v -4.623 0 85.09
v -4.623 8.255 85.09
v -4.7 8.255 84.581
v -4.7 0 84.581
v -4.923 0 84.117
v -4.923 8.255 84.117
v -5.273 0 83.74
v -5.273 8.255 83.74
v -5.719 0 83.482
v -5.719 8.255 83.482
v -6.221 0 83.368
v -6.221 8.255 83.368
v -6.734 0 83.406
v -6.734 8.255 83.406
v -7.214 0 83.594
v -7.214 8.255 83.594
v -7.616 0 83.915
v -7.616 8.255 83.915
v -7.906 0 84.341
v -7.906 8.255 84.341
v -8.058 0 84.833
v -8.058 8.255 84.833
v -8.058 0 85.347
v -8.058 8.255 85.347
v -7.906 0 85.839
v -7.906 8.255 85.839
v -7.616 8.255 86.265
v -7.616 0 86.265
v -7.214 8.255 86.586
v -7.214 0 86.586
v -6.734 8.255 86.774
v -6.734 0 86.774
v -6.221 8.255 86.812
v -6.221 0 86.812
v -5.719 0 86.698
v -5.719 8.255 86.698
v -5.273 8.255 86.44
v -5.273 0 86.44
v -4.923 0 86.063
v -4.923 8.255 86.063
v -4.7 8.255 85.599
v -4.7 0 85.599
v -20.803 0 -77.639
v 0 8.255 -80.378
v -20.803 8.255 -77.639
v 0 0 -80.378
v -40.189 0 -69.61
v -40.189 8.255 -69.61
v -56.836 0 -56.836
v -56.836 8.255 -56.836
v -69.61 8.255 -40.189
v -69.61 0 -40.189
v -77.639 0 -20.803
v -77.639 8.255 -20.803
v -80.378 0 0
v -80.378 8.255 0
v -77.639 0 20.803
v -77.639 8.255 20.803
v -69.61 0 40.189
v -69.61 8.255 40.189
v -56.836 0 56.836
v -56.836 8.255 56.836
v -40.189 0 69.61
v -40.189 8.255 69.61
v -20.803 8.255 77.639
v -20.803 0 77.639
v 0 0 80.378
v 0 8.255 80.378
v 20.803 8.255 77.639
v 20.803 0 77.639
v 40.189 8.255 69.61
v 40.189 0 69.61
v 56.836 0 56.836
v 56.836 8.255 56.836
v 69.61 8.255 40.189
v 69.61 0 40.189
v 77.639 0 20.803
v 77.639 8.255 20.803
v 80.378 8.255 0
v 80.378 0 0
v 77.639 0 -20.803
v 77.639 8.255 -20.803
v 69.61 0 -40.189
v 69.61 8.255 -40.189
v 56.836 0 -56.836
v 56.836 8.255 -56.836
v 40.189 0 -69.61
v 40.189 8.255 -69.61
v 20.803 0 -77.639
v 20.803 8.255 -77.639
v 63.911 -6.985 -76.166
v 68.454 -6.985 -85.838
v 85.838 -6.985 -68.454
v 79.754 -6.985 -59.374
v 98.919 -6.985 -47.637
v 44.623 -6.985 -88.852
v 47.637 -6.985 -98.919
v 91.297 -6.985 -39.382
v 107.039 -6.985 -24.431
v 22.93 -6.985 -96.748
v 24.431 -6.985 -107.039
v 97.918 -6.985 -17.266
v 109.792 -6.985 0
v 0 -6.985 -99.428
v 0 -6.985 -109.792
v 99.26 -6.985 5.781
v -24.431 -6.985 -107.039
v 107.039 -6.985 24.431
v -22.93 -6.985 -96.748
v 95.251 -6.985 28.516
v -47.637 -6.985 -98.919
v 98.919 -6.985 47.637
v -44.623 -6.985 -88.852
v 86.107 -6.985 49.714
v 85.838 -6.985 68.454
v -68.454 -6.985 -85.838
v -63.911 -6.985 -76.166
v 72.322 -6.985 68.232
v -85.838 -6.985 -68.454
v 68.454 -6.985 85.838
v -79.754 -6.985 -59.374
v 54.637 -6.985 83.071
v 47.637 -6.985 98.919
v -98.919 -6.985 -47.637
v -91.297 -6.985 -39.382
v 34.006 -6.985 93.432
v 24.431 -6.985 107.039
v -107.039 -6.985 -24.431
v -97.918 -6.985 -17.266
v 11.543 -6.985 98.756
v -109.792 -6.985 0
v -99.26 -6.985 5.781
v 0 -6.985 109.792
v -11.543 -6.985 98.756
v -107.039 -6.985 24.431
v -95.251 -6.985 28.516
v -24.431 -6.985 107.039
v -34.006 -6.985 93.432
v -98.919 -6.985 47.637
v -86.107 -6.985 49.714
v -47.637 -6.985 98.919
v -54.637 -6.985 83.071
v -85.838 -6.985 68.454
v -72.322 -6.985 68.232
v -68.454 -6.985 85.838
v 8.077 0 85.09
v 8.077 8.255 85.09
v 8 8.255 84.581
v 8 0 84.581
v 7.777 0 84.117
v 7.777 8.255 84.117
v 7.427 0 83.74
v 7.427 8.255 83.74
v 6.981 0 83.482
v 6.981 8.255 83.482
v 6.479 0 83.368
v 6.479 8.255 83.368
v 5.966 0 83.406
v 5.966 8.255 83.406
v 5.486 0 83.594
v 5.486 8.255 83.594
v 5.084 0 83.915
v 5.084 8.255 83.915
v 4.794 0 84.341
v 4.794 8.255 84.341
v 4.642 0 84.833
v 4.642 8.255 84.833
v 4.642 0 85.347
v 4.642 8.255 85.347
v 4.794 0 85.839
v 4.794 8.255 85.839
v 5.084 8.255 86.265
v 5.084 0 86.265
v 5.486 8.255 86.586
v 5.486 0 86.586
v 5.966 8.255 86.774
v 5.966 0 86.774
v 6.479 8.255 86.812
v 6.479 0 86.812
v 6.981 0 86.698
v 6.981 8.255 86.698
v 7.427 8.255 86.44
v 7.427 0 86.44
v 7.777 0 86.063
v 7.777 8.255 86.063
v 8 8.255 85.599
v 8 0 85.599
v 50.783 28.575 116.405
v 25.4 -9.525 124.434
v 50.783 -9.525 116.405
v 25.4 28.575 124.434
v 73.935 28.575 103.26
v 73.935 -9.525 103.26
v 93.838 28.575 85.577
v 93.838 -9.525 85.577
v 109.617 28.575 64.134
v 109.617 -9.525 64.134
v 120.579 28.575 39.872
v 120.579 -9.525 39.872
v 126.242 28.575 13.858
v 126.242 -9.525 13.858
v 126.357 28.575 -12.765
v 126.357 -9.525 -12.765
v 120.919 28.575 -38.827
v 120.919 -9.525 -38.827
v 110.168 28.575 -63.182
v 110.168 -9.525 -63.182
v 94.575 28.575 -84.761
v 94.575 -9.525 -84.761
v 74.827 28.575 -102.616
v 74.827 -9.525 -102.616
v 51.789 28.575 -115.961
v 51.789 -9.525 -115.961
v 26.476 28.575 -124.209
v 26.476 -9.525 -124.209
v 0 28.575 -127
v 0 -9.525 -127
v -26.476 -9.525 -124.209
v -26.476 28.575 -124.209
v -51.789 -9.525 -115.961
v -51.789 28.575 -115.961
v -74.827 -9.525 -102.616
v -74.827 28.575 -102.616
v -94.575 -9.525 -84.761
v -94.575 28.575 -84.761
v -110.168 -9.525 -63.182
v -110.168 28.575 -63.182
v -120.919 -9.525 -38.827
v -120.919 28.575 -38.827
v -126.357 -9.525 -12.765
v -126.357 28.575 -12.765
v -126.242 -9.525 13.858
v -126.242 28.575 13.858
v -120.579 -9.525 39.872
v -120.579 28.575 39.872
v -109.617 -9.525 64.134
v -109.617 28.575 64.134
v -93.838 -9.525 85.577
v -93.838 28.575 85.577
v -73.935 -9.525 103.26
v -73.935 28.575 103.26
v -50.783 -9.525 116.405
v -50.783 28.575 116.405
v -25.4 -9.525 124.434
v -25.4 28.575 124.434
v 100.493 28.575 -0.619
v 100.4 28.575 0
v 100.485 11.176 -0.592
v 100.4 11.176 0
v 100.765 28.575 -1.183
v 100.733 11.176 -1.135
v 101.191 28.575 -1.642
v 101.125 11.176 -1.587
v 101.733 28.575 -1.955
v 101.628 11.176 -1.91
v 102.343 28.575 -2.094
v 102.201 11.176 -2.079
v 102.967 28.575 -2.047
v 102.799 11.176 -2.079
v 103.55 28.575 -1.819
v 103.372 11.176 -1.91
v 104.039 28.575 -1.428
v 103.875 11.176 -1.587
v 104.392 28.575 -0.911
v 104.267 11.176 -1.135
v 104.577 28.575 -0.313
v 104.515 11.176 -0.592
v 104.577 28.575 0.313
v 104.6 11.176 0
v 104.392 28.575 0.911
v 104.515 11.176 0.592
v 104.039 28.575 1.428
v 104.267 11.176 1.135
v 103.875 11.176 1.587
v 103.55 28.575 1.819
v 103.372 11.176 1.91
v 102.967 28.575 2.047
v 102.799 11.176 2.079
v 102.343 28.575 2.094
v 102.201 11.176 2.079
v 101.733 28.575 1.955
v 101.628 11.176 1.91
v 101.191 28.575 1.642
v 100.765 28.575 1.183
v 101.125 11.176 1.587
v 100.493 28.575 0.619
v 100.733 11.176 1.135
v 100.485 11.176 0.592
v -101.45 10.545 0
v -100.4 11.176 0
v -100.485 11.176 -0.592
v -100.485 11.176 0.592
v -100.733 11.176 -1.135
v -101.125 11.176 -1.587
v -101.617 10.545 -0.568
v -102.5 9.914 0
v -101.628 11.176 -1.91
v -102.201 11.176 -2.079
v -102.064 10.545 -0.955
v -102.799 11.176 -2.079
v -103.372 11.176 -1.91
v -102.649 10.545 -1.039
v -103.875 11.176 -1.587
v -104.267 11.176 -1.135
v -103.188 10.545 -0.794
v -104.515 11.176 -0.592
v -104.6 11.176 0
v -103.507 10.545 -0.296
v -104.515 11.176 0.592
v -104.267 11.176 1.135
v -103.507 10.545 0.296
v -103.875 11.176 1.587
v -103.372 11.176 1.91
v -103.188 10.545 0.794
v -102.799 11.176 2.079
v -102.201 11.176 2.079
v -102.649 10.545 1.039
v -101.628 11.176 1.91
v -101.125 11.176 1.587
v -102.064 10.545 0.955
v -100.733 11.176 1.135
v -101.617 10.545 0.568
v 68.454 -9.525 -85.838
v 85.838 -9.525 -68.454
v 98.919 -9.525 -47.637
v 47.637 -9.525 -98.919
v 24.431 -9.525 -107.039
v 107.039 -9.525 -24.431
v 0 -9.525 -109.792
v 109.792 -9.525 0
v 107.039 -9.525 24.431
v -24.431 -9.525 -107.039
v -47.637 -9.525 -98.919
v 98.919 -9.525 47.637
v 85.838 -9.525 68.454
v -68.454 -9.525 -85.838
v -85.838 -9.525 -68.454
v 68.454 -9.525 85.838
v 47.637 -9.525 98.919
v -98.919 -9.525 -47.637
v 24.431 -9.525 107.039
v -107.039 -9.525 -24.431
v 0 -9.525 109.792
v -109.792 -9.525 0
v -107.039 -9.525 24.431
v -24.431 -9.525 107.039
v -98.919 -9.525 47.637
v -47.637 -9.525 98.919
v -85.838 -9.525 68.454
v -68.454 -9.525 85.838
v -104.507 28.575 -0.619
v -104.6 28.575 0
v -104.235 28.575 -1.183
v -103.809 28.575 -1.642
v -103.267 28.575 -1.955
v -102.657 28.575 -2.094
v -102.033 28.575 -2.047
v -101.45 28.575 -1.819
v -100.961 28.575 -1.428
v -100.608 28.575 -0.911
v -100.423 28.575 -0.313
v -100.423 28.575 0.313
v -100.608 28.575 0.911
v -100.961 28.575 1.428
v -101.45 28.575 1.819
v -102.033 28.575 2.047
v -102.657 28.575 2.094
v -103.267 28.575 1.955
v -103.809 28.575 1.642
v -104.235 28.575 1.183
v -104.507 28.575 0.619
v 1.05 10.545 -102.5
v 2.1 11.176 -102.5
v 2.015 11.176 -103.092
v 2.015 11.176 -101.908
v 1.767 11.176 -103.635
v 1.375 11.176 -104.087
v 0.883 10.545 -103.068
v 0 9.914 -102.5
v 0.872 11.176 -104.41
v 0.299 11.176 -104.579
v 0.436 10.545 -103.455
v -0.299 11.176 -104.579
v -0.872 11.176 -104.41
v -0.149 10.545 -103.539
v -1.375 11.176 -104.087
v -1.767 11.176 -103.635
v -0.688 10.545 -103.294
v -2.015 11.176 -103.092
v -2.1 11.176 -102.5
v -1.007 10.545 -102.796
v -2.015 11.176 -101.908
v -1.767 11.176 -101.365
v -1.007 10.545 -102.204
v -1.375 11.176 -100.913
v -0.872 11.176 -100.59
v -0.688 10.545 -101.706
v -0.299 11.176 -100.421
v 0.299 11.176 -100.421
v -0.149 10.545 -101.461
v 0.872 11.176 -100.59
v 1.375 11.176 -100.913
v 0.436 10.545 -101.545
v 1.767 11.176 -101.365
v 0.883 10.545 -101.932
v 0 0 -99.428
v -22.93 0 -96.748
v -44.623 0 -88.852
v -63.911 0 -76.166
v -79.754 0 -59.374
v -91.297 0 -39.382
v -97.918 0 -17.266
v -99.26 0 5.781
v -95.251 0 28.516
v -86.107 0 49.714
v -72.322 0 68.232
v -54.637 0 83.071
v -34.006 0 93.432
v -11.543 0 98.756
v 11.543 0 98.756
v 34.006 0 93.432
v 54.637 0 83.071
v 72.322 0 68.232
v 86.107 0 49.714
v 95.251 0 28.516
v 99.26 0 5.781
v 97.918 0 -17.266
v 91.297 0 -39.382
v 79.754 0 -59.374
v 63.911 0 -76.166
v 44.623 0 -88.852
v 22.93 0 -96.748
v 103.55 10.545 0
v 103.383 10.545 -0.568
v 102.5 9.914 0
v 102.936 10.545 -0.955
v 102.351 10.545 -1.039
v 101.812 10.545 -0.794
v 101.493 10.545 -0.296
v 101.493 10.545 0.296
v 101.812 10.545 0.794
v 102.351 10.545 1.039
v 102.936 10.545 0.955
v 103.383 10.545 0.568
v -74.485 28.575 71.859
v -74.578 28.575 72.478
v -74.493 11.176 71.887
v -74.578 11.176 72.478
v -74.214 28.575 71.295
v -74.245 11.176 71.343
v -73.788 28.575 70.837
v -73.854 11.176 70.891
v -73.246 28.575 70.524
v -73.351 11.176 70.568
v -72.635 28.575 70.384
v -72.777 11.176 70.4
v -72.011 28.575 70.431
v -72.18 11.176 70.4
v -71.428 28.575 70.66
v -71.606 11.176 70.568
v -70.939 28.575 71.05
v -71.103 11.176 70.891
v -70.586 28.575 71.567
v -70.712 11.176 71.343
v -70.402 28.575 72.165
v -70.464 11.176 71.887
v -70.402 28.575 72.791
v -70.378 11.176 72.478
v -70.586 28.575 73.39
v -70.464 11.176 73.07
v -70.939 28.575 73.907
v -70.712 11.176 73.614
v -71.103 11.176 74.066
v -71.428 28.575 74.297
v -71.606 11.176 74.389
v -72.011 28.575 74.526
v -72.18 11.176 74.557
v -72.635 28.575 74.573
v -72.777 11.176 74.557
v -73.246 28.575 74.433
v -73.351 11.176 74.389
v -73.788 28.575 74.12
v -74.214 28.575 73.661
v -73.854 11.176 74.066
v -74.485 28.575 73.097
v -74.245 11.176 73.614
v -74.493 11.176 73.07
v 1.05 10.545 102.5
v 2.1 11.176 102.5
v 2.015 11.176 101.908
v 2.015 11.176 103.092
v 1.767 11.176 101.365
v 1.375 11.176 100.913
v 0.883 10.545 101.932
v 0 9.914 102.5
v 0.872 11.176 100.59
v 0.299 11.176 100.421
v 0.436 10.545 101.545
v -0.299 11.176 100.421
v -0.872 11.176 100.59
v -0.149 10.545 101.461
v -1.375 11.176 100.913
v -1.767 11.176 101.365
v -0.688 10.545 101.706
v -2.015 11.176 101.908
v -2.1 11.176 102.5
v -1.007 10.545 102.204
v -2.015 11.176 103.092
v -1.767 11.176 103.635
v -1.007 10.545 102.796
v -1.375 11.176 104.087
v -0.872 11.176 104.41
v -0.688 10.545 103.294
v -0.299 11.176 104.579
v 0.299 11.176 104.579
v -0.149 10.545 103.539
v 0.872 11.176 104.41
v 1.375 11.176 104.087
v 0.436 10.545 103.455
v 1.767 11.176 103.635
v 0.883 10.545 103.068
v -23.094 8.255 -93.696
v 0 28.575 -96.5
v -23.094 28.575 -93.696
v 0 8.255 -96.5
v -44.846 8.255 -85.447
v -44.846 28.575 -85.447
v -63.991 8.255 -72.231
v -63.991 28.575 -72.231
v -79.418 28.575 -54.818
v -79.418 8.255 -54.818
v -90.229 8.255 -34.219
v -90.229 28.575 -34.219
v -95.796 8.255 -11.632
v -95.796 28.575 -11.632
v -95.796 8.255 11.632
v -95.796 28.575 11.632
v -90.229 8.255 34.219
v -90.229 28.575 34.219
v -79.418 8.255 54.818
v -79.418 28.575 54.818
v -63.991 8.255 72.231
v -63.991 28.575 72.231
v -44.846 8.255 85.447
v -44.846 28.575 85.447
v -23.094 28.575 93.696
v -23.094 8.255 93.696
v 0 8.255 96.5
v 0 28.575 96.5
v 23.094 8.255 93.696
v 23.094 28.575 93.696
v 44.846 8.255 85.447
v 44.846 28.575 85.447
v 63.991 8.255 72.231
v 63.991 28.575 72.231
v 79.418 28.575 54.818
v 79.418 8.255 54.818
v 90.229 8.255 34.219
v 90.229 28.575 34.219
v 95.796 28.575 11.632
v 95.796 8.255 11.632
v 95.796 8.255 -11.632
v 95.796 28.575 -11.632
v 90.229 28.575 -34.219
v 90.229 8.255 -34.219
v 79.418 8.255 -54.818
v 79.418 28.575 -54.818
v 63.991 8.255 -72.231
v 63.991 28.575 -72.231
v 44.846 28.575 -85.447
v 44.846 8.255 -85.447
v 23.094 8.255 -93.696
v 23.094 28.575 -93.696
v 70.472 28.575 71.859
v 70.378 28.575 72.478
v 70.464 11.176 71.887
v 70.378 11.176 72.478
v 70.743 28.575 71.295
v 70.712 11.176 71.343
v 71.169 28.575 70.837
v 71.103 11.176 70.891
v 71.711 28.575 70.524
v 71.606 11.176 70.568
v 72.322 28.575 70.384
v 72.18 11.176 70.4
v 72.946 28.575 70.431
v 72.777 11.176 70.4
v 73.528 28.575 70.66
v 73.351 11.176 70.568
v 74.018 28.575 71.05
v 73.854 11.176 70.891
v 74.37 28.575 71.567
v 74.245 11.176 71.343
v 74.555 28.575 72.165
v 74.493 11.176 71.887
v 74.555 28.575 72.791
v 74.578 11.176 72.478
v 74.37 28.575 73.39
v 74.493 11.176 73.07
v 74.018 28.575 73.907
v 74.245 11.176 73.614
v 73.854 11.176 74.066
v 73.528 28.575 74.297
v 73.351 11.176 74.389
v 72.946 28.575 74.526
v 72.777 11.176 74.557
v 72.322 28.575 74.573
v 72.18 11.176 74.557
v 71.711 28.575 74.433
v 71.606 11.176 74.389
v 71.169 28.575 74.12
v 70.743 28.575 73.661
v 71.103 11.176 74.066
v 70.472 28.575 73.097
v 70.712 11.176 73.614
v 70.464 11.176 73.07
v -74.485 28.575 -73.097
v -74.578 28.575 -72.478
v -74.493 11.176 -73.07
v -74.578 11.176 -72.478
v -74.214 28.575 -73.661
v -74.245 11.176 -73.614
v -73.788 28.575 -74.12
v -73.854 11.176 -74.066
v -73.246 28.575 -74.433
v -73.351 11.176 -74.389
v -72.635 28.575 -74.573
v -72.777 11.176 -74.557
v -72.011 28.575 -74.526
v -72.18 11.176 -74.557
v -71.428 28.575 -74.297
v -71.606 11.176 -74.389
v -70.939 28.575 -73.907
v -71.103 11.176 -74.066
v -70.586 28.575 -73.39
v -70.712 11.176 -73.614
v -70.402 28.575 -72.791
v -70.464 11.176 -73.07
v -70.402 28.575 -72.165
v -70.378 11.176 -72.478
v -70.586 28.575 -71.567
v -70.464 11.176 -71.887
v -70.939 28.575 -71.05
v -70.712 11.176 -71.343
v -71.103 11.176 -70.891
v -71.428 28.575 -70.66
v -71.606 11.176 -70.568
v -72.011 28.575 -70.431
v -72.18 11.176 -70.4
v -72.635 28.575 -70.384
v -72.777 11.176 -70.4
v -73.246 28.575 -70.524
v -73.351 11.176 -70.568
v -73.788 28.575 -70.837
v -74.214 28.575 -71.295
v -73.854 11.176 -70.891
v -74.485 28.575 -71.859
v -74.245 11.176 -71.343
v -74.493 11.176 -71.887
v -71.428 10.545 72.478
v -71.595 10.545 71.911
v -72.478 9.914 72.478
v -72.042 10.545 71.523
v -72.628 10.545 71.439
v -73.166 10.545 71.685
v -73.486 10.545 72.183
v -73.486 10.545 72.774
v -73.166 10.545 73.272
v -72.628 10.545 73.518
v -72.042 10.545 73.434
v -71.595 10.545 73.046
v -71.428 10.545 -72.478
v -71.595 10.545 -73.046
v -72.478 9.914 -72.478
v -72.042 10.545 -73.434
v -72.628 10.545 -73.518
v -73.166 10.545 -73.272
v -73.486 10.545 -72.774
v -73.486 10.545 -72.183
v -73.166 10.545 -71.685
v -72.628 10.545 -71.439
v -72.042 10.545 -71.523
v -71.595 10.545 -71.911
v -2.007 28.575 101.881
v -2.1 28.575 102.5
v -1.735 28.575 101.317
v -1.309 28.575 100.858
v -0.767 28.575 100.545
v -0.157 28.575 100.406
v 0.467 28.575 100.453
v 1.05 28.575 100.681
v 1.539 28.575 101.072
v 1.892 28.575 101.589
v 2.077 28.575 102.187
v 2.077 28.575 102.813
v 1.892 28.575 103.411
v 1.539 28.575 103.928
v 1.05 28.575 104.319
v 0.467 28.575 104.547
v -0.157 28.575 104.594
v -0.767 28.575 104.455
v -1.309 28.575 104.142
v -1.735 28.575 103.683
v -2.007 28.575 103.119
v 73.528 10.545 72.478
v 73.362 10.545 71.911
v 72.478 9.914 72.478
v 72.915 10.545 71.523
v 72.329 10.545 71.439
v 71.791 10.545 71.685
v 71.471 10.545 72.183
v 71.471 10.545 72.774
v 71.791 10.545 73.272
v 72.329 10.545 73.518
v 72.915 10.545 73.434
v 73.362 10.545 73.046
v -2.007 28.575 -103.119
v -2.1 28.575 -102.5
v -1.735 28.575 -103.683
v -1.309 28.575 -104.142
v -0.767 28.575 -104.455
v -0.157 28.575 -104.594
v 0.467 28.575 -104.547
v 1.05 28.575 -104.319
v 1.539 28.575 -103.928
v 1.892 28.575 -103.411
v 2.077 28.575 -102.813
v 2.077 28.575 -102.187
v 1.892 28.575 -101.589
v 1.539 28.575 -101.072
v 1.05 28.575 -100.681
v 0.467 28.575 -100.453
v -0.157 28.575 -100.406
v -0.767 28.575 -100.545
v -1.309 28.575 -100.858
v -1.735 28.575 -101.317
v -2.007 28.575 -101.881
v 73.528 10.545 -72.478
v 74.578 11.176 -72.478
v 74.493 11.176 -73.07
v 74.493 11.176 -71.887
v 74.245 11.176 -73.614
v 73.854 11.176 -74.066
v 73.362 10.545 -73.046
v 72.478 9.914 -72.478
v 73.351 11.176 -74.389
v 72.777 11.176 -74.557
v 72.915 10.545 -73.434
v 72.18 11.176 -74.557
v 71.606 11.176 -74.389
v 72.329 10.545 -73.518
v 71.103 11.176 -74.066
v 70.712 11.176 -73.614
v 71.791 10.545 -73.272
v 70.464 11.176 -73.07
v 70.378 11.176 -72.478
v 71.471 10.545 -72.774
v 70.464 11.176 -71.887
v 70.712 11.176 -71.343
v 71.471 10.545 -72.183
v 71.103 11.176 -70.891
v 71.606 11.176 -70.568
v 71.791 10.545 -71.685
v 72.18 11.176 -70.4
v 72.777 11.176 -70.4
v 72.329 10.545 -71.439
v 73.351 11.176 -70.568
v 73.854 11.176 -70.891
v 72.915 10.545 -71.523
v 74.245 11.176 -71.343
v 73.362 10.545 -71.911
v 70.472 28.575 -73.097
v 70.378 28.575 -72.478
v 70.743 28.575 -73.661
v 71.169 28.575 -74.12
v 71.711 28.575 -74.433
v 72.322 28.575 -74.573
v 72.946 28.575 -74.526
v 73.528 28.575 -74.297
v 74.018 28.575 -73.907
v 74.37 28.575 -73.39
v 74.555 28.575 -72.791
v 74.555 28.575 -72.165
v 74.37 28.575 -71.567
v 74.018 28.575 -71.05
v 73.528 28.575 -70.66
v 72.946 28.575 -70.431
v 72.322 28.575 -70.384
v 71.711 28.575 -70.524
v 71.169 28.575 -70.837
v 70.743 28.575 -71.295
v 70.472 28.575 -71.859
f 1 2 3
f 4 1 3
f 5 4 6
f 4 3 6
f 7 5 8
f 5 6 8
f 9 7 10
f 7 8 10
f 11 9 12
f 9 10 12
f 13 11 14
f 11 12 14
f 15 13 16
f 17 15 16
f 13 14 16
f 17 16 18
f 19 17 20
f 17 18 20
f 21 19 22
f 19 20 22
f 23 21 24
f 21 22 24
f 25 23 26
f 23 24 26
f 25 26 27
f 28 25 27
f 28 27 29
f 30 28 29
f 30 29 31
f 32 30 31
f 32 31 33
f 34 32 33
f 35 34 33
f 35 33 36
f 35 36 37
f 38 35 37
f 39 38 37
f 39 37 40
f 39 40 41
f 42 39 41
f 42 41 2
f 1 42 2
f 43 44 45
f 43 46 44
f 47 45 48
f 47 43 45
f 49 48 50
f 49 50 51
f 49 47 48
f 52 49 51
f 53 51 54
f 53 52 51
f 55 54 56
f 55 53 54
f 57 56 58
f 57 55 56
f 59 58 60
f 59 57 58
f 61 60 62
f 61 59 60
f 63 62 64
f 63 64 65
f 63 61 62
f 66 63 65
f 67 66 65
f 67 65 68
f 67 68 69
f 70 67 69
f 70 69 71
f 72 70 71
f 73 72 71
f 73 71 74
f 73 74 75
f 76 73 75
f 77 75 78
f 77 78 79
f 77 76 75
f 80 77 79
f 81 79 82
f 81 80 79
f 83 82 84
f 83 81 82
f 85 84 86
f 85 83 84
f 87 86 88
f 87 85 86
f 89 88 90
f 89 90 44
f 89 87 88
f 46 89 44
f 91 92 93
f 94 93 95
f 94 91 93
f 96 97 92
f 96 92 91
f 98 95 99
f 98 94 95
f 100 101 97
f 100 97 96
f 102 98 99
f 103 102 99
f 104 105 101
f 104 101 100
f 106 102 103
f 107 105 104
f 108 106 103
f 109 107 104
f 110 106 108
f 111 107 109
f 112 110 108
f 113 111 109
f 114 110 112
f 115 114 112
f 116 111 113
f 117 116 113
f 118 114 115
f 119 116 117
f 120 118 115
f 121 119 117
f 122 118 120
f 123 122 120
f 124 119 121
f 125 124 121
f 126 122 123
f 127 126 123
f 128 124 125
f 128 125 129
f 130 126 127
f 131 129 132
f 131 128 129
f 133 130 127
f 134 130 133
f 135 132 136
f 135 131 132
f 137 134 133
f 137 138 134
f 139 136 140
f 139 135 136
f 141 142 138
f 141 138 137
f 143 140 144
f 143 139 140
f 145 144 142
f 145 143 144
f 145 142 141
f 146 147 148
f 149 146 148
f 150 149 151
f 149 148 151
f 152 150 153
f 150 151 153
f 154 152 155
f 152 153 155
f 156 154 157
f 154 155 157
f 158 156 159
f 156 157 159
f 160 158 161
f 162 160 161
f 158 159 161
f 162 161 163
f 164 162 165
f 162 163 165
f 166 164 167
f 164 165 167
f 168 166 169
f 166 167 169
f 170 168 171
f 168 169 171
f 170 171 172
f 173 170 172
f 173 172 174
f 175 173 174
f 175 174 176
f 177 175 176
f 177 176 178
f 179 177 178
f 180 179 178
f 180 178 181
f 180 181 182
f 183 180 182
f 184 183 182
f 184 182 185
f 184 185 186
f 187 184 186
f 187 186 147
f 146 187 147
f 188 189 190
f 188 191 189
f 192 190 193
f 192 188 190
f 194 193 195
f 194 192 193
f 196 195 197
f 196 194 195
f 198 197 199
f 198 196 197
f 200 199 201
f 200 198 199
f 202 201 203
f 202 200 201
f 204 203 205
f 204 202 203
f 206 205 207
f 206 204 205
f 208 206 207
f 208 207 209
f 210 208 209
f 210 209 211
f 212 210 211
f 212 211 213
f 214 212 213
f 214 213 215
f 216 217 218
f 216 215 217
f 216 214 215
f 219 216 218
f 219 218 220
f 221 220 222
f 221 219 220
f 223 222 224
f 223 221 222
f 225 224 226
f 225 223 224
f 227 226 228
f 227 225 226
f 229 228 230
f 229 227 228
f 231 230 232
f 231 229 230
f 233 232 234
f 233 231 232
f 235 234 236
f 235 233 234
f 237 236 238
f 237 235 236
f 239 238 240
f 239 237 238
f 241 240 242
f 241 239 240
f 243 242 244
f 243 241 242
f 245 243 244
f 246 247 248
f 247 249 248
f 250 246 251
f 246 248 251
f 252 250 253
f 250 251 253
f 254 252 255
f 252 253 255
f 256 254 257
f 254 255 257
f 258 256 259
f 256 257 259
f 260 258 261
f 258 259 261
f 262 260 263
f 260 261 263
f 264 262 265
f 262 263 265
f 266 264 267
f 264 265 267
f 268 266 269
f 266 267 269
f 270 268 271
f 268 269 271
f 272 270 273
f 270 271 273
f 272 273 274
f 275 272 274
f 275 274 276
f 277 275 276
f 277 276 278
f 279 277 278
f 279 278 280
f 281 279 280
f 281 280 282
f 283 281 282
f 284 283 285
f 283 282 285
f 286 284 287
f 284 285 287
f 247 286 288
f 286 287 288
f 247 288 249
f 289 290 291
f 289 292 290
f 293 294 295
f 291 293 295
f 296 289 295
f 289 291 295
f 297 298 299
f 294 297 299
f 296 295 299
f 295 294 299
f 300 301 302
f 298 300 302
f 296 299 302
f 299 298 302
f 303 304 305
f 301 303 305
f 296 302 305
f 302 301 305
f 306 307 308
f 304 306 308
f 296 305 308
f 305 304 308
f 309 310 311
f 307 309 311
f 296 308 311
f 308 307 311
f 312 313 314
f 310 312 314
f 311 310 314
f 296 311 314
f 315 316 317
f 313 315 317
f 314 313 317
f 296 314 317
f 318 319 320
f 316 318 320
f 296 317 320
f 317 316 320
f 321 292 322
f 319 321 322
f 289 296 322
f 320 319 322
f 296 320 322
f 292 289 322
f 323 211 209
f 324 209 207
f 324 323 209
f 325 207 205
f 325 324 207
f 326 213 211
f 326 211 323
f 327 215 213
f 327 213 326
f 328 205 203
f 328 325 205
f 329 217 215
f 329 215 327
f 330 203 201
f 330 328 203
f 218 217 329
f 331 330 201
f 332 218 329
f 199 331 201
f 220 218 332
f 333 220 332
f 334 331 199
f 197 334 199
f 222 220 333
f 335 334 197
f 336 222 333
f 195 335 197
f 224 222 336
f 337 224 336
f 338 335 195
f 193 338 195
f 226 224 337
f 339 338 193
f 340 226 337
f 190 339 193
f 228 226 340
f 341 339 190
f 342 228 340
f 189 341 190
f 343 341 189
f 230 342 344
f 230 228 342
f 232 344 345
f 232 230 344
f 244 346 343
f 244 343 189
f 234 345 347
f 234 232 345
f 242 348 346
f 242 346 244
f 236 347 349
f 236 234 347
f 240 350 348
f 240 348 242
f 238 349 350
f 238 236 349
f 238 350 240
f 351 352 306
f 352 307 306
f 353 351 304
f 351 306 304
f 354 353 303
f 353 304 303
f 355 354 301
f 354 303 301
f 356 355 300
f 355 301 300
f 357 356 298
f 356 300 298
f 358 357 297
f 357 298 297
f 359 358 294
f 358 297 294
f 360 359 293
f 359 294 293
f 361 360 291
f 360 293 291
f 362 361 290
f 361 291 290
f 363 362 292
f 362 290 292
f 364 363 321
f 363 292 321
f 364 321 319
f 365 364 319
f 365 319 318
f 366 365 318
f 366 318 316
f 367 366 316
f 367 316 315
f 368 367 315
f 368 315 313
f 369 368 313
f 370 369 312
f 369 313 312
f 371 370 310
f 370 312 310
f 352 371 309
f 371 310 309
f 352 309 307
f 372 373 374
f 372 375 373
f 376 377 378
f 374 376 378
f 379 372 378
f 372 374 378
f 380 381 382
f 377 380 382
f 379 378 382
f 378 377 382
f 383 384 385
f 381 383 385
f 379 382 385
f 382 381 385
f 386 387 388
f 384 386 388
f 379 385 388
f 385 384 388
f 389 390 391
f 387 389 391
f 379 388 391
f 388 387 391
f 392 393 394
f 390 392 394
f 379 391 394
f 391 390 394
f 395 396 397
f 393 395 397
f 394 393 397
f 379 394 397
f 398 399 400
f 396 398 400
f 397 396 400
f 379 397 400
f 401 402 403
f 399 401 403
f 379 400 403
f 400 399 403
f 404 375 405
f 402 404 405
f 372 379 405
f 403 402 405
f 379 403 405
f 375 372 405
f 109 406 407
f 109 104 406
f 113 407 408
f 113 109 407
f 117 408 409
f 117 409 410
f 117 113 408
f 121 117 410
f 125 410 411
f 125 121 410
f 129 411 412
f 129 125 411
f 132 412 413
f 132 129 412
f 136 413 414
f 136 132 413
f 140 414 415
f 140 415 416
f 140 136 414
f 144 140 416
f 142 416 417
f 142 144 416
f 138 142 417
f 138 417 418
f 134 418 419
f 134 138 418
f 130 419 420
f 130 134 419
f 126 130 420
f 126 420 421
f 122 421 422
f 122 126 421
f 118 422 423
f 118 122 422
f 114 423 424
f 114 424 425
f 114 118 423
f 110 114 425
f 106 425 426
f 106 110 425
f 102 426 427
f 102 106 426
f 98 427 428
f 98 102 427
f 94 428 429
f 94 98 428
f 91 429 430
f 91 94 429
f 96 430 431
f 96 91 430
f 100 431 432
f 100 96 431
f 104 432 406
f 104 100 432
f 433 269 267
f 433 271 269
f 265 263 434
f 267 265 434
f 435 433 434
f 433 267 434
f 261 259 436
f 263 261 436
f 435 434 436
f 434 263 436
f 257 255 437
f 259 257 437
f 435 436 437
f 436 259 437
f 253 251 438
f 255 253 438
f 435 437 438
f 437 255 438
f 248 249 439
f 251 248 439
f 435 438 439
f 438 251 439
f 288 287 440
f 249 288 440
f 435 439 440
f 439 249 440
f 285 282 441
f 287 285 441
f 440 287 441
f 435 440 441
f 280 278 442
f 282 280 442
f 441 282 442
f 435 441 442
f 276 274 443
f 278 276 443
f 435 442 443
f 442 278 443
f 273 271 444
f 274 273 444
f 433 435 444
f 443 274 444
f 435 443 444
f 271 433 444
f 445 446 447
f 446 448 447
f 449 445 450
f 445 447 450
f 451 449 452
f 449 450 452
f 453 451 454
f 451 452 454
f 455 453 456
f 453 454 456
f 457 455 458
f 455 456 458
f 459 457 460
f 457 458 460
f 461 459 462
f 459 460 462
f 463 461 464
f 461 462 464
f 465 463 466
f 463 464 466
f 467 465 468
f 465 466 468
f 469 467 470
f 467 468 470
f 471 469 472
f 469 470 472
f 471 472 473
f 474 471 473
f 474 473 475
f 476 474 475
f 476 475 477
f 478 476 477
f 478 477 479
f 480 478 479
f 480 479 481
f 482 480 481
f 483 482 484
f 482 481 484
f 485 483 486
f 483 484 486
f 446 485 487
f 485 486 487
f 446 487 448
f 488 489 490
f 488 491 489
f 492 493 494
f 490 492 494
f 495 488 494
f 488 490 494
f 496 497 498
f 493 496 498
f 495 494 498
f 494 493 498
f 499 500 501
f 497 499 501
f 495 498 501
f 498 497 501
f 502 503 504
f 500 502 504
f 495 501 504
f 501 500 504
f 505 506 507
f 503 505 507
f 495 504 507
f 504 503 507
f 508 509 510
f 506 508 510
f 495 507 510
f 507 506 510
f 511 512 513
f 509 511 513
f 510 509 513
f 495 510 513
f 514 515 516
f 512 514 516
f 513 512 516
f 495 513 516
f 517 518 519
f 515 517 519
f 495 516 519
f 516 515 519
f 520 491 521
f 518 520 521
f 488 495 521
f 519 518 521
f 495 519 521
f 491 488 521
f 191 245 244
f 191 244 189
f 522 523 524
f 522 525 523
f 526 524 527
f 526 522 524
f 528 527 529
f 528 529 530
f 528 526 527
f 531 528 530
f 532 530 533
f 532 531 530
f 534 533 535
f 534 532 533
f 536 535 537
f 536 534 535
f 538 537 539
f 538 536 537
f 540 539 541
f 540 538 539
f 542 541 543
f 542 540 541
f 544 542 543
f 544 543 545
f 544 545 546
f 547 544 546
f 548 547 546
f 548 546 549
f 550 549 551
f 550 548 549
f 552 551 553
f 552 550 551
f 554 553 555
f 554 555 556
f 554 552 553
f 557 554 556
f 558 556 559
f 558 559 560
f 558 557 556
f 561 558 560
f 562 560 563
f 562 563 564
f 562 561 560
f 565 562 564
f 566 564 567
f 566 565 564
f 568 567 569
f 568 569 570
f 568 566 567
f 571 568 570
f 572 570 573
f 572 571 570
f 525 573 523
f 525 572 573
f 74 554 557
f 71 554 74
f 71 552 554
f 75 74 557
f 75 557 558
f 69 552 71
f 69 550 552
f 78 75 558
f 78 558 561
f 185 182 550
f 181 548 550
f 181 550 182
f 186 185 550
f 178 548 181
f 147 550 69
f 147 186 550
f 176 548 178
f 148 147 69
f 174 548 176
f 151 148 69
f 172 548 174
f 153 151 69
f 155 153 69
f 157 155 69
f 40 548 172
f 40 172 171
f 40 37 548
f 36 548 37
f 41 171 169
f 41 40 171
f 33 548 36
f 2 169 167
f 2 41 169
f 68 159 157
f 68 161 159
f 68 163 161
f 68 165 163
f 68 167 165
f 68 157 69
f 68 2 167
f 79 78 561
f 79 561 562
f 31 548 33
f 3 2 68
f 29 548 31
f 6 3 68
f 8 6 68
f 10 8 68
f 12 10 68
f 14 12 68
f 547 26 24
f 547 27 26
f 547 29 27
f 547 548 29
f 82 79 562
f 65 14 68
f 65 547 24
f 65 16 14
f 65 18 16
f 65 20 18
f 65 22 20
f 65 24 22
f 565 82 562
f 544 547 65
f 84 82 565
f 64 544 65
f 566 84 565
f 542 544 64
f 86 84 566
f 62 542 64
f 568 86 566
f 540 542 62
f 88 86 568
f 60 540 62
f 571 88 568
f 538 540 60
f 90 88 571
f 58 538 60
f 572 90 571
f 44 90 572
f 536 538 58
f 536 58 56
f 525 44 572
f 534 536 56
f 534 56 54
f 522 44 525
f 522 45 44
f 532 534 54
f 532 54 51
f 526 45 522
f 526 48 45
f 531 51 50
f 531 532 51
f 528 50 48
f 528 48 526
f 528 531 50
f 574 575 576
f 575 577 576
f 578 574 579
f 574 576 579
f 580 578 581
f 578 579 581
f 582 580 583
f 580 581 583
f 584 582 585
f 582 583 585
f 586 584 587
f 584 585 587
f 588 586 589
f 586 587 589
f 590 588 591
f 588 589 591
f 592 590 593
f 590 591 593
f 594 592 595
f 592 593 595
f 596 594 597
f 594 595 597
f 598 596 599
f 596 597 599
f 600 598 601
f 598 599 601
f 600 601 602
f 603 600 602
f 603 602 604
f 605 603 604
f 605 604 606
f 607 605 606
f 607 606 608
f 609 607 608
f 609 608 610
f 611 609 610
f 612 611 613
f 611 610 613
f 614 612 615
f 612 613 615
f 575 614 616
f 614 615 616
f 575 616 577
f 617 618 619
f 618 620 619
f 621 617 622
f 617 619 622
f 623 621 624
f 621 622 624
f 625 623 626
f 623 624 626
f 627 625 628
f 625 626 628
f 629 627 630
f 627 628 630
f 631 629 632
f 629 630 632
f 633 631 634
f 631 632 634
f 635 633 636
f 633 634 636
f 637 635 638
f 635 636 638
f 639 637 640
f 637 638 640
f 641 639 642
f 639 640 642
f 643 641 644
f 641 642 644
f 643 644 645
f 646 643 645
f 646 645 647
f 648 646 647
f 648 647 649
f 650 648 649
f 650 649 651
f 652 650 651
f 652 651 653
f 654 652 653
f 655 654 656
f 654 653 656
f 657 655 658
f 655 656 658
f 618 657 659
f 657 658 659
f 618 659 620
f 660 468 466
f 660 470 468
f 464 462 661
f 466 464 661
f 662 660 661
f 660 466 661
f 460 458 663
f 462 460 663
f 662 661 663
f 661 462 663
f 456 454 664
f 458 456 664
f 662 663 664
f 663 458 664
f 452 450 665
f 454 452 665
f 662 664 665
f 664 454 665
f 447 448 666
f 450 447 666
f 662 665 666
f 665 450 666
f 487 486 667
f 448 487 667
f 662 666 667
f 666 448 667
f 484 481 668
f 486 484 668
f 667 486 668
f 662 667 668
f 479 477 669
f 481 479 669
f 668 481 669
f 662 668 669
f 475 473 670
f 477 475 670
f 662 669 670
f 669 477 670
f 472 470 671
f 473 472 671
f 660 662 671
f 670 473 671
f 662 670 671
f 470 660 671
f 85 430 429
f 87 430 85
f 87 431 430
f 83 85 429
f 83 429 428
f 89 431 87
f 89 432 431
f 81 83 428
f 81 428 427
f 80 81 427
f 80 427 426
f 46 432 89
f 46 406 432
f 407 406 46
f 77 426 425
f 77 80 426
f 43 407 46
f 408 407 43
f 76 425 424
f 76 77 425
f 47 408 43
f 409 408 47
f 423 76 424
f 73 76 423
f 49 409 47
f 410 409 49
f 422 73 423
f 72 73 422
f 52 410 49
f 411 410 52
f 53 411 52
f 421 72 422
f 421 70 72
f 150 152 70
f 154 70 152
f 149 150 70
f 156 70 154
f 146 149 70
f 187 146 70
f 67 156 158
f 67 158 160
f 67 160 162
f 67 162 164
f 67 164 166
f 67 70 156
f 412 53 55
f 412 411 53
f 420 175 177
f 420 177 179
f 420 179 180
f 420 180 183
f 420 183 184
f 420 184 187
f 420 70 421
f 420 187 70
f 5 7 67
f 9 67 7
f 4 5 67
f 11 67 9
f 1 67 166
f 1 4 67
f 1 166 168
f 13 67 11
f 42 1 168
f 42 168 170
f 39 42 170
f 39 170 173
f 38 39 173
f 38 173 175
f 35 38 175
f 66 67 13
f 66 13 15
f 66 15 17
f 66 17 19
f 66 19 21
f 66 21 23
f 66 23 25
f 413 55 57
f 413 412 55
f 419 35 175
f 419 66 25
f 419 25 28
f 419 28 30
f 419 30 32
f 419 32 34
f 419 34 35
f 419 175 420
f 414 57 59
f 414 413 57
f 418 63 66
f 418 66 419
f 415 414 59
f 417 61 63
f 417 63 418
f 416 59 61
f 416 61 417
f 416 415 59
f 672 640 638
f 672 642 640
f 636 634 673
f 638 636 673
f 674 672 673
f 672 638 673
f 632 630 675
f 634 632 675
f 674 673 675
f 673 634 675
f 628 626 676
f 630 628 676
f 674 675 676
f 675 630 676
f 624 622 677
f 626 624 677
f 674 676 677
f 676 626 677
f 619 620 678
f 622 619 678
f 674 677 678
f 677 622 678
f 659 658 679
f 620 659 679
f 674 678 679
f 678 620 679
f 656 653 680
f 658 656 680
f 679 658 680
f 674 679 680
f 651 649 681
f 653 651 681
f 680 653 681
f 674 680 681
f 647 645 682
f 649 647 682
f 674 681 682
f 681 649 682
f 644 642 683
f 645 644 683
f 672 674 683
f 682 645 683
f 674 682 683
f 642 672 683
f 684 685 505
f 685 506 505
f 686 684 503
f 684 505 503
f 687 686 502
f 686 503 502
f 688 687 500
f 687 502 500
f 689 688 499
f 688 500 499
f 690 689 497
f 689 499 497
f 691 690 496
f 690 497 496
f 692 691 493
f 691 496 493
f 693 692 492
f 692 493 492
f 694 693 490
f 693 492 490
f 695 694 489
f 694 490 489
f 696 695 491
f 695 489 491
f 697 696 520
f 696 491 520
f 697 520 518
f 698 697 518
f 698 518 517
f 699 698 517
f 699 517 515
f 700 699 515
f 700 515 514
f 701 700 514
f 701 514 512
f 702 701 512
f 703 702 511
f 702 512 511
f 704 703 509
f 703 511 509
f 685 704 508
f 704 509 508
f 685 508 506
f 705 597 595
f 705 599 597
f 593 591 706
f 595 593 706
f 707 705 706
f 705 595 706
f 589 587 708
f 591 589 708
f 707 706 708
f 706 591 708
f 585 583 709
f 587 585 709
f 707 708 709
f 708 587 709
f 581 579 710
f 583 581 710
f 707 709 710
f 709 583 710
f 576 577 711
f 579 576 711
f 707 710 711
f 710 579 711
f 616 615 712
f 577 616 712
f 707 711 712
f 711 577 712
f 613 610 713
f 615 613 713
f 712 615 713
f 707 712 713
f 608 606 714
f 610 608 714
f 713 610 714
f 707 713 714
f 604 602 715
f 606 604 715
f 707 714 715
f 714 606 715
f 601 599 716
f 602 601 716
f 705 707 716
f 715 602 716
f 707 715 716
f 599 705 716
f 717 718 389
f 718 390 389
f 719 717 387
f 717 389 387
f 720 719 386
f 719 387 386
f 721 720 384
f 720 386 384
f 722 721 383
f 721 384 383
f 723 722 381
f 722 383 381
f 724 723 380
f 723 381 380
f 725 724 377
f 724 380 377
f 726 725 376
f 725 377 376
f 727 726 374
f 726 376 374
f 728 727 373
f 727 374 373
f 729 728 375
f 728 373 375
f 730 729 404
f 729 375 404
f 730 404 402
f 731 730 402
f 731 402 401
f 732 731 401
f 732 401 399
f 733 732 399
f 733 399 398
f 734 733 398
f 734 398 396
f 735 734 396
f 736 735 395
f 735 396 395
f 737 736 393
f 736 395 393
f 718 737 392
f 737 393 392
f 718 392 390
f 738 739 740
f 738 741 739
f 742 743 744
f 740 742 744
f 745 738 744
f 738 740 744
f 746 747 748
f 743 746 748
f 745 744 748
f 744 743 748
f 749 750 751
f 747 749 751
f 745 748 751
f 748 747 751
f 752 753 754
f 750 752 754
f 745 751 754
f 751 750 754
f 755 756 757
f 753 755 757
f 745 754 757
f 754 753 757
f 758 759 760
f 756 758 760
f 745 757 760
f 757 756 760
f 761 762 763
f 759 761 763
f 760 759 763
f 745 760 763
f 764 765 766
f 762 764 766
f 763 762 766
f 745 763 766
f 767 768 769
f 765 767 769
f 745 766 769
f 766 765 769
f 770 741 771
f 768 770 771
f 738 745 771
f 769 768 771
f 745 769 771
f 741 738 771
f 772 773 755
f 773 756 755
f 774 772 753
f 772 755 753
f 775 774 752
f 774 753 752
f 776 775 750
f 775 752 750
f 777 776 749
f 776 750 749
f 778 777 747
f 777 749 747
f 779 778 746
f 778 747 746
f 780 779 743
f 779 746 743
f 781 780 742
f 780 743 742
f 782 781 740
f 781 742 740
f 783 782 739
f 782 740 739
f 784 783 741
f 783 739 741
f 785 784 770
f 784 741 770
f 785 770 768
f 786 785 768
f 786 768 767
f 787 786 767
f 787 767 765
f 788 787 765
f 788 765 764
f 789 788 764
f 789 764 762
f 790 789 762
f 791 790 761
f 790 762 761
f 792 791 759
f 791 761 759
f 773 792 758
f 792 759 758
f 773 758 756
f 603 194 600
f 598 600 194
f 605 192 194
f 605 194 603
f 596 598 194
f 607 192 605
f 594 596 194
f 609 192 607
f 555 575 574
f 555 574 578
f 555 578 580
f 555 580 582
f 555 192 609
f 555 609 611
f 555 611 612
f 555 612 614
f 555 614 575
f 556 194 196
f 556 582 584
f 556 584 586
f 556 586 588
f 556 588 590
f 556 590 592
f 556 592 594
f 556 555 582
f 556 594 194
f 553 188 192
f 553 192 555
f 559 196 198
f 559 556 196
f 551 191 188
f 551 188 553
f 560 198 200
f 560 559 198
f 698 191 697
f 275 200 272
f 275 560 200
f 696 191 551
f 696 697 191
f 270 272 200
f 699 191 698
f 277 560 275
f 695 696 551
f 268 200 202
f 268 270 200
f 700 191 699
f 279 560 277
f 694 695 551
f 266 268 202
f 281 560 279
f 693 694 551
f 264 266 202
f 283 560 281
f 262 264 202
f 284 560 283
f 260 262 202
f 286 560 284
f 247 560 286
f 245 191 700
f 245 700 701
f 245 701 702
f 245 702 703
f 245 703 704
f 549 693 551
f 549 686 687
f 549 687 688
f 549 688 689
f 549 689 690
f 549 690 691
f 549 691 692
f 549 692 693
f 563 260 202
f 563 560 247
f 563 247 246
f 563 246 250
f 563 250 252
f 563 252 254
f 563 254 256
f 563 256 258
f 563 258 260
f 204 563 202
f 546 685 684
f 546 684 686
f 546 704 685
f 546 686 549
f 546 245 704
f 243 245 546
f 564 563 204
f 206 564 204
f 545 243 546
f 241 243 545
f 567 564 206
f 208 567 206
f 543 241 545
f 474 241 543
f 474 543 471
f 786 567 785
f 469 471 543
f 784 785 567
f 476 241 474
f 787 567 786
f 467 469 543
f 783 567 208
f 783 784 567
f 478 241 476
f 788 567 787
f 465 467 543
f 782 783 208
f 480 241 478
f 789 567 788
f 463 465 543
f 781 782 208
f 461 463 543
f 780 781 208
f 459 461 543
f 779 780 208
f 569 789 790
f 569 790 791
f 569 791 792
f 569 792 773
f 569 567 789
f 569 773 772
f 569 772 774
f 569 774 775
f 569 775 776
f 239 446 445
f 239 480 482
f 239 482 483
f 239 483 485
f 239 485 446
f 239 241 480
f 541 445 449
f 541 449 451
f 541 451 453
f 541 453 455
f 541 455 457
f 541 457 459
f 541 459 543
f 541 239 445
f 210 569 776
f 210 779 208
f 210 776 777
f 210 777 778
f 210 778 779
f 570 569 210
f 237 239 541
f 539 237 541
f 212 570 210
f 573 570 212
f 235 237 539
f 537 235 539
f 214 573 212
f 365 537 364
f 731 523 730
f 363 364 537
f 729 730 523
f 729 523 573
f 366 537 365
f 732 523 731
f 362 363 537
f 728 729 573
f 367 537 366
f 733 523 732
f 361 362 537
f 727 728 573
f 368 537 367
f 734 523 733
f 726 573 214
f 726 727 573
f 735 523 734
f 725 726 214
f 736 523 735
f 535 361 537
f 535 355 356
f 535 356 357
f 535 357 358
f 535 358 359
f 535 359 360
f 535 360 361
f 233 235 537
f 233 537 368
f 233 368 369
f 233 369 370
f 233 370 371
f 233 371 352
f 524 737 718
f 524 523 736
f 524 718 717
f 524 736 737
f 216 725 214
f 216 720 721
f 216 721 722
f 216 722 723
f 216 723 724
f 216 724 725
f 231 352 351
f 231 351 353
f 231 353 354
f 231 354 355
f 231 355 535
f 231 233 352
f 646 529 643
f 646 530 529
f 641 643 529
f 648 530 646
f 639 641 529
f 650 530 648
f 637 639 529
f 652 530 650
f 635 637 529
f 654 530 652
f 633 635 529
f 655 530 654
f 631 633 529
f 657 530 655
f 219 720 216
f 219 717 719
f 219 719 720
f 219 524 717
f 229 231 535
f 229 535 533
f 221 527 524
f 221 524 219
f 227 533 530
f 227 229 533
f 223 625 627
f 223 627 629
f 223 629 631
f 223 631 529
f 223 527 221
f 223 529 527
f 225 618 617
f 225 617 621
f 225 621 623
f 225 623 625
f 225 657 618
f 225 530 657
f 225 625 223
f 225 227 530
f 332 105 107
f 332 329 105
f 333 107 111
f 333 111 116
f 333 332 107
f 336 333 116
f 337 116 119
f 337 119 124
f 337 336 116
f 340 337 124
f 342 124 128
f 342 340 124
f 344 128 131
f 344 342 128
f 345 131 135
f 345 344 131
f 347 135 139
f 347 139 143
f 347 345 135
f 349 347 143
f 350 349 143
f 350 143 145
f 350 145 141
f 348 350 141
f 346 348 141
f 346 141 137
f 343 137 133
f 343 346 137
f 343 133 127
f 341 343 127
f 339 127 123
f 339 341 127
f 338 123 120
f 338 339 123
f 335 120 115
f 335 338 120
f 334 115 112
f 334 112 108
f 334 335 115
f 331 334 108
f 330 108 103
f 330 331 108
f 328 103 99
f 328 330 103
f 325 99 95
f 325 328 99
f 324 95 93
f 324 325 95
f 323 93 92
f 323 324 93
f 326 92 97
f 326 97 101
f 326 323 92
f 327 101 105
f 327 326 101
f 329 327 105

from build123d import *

# Parameters (mm, degrees)
M5X0_8_TAPPED_HOLE1_D     = 4.2
M5X0_8_TAPPED_HOLE1_DEPTH = 17.399
M5X0_8_TAPPED_HOLE1_TIP   = 1.2618073
CUT_EXTRUDE1_REACH        = 185.602
SKETCH7_W                 = 50.8
SKETCH7_H                 = 2.565921067
F_8_32_TAPPED_HOLE1_D     = 3.4544


with BuildPart() as part:
    # Sketch1 → Revolve1 (revolve)
    with BuildSketch(Plane.XY, mode=Mode.PRIVATE) as revolve1_sk:
        Polygon((80.3783, 0), (99.4283, 0), (99.4283, -6.985), (109.7915, -6.985), (109.7915, -9.525), (127, -9.525), (127, 28.575), (96.5, 28.575), (96.5, 8.255), (80.3783, 8.255), align=None)
    revolve(revolve1_sk.sketch.rotate(Axis((0, 0, 0), (0, 1, 0)), 90), axis=Axis((0, 0, 0), (0, 1, 0)))

    # M5x0.8 Tapped Hole1
    with Locations(Plane(origin=(0, 28.575, 0), x_dir=(1, 0, 0), z_dir=(0, 1, 0))):
        with Locations((0, 102.5), (72.478445072, 72.478445072), (102.5, 0), (72.478445072, -72.478445072), (0, -102.5), (-72.478445072, -72.478445072), (-102.5, 0), (-72.478445072, 72.478445072)):
            Hole(M5X0_8_TAPPED_HOLE1_D / 2, depth=M5X0_8_TAPPED_HOLE1_DEPTH)
            with Locations((0, 0, -(M5X0_8_TAPPED_HOLE1_DEPTH + M5X0_8_TAPPED_HOLE1_TIP / 2))):  # 118° drill point
                Cone(0, M5X0_8_TAPPED_HOLE1_D / 2, M5X0_8_TAPPED_HOLE1_TIP, mode=Mode.SUBTRACT)

    # Sketch7 → Cut-Extrude1 (cut, up to next)
    with BuildSketch(Plane(origin=(0, 28.575, 0), x_dir=(1, 0, 0), z_dir=(0, 1, 0)), mode=Mode.PRIVATE) as cut_extrude1_sk1:
        with Locations((0, -125.717039467)):
            Rectangle(SKETCH7_W, SKETCH7_H)
    cut_extrude1_tool1 = extrude(cut_extrude1_sk1.sketch, amount=-CUT_EXTRUDE1_REACH, mode=Mode.PRIVATE) & part.part
    add(cut_extrude1_tool1.solids().sort_by_distance((0, 28.575, 125.717039))[0], mode=Mode.SUBTRACT)

    # #8-32 Tapped Hole1 (through all)
    with Locations(Plane(origin=(0, 0, 0), x_dir=(-1, 0, 0), z_dir=(0, -1, 0))):
        with Locations((-6.35, -85.09), (6.35, -85.09)):
            Hole(F_8_32_TAPPED_HOLE1_D / 2)


solid = part.part
